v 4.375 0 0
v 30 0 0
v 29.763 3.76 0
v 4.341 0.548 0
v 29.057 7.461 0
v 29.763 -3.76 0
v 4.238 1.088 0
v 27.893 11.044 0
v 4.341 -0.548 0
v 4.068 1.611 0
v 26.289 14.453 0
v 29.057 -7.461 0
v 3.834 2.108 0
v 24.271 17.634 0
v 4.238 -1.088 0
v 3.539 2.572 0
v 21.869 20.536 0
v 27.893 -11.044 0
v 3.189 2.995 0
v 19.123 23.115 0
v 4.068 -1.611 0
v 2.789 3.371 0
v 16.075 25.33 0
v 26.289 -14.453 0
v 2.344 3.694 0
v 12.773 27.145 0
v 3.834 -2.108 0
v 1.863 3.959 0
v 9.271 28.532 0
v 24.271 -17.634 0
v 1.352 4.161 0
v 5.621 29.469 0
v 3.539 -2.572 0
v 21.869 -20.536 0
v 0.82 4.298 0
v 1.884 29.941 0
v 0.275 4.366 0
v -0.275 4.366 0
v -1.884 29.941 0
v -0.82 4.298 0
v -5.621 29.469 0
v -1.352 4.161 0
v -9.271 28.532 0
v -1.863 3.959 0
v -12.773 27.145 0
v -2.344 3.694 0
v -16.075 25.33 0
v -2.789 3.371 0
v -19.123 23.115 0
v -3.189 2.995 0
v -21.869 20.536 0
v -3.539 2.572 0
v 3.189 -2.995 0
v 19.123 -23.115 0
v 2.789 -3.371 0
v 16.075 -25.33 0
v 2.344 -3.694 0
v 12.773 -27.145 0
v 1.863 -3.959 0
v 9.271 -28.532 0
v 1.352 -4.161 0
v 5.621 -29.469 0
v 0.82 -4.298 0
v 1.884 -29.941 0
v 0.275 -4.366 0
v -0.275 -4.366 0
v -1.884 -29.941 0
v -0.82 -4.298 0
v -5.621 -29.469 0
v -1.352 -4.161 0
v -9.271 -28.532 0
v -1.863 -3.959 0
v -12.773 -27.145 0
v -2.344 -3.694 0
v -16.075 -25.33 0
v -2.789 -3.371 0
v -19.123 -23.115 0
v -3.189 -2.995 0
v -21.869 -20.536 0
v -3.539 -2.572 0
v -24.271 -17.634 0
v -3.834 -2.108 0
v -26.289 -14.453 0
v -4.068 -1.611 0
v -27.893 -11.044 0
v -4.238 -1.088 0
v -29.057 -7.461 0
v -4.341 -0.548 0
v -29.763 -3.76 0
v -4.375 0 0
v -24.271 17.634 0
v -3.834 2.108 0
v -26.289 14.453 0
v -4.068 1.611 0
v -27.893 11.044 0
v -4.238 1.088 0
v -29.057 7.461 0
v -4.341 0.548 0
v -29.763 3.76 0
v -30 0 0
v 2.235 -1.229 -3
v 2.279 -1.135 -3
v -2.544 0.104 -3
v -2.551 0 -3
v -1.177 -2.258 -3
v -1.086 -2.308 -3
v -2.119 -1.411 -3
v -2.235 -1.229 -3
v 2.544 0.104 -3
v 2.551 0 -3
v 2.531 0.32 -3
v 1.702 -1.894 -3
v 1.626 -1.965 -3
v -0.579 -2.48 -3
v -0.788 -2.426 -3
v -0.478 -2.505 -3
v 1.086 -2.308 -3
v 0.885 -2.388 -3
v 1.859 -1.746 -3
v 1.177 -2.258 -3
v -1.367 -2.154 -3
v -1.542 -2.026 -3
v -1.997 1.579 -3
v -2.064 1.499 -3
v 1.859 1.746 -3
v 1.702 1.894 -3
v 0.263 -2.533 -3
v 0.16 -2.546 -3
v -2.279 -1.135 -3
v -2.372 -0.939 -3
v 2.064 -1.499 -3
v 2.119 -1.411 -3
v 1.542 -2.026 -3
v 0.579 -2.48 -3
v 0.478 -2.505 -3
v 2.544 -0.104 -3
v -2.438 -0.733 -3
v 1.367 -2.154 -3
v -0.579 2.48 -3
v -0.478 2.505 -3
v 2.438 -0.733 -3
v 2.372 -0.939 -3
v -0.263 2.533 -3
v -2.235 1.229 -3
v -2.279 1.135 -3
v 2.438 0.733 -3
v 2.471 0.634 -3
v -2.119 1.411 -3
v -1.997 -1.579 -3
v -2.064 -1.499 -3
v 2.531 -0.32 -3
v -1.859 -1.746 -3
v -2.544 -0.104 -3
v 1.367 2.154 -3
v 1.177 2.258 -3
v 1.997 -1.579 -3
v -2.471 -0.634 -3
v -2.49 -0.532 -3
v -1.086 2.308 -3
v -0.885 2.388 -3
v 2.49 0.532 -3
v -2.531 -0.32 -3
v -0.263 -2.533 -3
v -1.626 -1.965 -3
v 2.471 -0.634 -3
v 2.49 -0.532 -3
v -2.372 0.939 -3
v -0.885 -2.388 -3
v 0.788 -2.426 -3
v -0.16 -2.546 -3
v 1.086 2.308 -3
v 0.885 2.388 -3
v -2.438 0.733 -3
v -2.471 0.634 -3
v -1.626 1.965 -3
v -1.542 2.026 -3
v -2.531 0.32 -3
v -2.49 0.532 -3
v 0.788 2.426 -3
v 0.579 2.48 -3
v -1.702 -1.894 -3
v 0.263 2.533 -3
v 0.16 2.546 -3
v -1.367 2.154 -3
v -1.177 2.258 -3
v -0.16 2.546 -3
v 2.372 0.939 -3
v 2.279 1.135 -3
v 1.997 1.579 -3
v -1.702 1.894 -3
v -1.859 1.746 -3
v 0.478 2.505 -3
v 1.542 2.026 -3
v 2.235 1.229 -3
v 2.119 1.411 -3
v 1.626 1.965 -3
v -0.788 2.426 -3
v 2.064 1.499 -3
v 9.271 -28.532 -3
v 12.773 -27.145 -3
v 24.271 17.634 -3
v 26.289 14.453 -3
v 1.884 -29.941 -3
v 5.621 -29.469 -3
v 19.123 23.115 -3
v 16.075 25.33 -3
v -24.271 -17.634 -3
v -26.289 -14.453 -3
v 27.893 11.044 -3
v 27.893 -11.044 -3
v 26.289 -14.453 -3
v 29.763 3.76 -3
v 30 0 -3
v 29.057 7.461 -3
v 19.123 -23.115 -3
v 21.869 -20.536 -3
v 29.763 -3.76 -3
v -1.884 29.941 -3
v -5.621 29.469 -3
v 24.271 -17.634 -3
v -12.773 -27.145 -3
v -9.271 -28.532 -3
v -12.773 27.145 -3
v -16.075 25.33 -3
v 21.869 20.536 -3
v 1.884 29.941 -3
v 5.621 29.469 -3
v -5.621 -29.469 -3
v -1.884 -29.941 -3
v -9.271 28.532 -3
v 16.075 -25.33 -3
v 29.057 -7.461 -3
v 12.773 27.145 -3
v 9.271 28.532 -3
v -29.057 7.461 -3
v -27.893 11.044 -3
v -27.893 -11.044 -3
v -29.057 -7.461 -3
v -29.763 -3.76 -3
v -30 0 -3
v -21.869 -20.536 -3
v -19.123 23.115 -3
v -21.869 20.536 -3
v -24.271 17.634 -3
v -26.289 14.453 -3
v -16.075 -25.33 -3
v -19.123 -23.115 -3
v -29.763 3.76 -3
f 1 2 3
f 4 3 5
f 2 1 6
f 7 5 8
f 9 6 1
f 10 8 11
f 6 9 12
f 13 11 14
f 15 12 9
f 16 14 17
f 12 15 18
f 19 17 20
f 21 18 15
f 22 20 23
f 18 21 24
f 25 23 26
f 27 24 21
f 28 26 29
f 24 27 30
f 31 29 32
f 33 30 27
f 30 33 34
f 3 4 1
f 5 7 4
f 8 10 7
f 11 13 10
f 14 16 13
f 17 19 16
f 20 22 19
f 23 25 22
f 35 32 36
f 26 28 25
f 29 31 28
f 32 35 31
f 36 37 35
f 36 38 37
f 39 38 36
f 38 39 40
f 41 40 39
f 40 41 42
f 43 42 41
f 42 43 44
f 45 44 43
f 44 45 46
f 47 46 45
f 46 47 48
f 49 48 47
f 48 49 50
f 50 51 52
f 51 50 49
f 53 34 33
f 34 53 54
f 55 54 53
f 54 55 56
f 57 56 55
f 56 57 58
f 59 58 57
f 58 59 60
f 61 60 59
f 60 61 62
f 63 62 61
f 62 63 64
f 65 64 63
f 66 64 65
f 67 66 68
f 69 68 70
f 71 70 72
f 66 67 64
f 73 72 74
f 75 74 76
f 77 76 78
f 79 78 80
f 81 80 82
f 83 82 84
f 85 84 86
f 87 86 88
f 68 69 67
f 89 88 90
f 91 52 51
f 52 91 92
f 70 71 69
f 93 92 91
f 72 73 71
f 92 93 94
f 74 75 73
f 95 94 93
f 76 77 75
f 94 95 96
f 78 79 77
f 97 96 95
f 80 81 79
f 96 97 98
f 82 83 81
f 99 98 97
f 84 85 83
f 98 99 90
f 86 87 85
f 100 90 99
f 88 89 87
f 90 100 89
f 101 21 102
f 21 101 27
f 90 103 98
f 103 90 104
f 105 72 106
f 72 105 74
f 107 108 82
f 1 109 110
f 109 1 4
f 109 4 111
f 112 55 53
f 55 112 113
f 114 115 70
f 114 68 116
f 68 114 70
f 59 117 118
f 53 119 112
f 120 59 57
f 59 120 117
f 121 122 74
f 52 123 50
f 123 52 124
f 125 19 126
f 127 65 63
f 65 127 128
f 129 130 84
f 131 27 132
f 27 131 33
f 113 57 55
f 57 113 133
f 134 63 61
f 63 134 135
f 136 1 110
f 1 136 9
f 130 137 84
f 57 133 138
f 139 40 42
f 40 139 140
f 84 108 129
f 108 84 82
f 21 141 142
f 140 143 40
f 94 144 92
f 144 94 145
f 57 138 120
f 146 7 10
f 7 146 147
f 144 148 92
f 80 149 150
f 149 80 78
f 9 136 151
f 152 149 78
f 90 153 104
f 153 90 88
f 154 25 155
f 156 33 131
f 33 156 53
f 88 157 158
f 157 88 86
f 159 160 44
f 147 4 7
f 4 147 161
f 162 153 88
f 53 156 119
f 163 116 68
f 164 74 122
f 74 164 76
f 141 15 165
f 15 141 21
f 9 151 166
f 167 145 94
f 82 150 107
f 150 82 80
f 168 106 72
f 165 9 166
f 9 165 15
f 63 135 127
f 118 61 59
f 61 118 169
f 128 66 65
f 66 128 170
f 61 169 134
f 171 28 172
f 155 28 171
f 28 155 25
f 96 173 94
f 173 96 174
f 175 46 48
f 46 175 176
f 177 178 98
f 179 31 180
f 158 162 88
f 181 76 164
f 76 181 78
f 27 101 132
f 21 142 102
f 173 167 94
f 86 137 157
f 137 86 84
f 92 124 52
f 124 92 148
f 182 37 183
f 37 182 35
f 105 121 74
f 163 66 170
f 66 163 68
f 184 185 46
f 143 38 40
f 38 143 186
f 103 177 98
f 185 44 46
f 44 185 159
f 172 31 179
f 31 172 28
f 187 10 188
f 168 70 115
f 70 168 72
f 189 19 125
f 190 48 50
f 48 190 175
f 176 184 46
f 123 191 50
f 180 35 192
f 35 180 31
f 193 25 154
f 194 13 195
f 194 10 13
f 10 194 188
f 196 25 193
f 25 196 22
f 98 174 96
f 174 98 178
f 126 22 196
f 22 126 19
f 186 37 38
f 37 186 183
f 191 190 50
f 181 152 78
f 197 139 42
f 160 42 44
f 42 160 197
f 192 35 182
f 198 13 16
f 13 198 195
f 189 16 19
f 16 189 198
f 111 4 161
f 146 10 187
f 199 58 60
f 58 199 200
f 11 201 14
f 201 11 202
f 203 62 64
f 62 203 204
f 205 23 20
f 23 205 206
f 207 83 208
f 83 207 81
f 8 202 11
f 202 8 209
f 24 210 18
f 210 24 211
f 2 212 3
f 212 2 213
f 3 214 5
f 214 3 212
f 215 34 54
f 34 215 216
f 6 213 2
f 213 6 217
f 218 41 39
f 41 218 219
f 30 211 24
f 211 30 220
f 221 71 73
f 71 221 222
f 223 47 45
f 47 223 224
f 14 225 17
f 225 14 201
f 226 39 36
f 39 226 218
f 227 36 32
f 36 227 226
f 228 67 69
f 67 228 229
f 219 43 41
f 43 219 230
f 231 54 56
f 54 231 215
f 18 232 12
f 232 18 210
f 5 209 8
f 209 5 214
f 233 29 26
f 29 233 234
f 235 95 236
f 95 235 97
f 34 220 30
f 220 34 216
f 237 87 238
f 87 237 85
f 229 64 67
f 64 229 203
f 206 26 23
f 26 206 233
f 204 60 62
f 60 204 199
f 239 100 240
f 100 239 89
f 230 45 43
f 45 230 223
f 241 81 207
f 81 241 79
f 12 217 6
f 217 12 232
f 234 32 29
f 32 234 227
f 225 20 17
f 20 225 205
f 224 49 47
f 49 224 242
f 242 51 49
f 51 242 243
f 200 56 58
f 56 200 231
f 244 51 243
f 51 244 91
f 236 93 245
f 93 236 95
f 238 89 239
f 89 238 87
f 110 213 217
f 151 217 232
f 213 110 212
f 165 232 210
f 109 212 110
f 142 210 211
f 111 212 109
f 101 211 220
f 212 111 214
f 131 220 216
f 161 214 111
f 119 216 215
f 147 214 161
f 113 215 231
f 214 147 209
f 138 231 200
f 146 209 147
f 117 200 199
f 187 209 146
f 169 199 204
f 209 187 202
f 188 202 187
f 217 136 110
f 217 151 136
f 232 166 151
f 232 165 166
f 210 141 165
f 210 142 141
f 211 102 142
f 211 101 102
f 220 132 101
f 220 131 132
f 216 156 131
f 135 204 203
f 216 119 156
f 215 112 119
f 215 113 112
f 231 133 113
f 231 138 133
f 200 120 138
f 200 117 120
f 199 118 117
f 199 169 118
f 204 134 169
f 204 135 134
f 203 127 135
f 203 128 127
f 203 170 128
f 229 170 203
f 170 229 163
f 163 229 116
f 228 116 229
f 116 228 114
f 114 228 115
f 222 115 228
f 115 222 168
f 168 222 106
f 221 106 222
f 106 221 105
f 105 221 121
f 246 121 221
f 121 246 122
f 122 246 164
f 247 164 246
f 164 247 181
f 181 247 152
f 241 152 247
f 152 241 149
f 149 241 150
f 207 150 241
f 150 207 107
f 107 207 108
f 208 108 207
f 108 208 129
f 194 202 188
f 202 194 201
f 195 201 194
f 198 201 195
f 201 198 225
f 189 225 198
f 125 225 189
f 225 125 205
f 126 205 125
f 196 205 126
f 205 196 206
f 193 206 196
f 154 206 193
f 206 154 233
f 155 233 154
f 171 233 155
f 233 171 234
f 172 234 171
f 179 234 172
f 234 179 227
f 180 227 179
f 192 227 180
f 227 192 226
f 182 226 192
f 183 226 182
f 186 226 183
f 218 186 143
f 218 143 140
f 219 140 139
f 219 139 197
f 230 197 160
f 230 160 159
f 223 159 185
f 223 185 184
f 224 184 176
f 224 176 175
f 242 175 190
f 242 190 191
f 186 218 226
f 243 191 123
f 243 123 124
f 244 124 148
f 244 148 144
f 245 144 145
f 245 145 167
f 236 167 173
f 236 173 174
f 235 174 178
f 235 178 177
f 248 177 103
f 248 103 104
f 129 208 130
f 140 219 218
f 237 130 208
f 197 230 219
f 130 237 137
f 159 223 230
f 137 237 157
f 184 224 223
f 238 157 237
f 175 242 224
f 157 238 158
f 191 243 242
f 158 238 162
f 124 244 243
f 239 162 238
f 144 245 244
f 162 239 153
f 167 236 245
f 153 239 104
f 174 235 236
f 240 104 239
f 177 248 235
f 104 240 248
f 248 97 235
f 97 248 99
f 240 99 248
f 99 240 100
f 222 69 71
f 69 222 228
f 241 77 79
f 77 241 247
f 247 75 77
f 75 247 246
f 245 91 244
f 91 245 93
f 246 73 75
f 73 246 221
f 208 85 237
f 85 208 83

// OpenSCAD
$fn = 50;


difference() {
	union() {
		translate(v = [0, 0, -3.0000000000]) {
			cylinder(h = 3, r = 30.0000000000);
		}
	}
	union() {
		translate(v = [0, 0, 0]) {
			rotate(a = [0, 0, 0]) {
				difference() {
					union() {
						translate(v = [0, 0, -3.0000000000]) {
							cylinder(h = 3, r = 2.0000000000);
						}
						translate(v = [0, 0, -3.7000000000]) {
							cylinder(h = 3.7000000000, r1 = 2.1250000000, r2 = 4.3750000000);
						}
						translate(v = [0, 0, -3.0000000000]) {
							cylinder(h = 3, r = 2.1250000000);
						}
						translate(v = [0, 0, -3.0000000000]) {
							cylinder(h = 3, r = 2.0000000000);
						}
					}
					union();
				}
			}
		}
	}
}
